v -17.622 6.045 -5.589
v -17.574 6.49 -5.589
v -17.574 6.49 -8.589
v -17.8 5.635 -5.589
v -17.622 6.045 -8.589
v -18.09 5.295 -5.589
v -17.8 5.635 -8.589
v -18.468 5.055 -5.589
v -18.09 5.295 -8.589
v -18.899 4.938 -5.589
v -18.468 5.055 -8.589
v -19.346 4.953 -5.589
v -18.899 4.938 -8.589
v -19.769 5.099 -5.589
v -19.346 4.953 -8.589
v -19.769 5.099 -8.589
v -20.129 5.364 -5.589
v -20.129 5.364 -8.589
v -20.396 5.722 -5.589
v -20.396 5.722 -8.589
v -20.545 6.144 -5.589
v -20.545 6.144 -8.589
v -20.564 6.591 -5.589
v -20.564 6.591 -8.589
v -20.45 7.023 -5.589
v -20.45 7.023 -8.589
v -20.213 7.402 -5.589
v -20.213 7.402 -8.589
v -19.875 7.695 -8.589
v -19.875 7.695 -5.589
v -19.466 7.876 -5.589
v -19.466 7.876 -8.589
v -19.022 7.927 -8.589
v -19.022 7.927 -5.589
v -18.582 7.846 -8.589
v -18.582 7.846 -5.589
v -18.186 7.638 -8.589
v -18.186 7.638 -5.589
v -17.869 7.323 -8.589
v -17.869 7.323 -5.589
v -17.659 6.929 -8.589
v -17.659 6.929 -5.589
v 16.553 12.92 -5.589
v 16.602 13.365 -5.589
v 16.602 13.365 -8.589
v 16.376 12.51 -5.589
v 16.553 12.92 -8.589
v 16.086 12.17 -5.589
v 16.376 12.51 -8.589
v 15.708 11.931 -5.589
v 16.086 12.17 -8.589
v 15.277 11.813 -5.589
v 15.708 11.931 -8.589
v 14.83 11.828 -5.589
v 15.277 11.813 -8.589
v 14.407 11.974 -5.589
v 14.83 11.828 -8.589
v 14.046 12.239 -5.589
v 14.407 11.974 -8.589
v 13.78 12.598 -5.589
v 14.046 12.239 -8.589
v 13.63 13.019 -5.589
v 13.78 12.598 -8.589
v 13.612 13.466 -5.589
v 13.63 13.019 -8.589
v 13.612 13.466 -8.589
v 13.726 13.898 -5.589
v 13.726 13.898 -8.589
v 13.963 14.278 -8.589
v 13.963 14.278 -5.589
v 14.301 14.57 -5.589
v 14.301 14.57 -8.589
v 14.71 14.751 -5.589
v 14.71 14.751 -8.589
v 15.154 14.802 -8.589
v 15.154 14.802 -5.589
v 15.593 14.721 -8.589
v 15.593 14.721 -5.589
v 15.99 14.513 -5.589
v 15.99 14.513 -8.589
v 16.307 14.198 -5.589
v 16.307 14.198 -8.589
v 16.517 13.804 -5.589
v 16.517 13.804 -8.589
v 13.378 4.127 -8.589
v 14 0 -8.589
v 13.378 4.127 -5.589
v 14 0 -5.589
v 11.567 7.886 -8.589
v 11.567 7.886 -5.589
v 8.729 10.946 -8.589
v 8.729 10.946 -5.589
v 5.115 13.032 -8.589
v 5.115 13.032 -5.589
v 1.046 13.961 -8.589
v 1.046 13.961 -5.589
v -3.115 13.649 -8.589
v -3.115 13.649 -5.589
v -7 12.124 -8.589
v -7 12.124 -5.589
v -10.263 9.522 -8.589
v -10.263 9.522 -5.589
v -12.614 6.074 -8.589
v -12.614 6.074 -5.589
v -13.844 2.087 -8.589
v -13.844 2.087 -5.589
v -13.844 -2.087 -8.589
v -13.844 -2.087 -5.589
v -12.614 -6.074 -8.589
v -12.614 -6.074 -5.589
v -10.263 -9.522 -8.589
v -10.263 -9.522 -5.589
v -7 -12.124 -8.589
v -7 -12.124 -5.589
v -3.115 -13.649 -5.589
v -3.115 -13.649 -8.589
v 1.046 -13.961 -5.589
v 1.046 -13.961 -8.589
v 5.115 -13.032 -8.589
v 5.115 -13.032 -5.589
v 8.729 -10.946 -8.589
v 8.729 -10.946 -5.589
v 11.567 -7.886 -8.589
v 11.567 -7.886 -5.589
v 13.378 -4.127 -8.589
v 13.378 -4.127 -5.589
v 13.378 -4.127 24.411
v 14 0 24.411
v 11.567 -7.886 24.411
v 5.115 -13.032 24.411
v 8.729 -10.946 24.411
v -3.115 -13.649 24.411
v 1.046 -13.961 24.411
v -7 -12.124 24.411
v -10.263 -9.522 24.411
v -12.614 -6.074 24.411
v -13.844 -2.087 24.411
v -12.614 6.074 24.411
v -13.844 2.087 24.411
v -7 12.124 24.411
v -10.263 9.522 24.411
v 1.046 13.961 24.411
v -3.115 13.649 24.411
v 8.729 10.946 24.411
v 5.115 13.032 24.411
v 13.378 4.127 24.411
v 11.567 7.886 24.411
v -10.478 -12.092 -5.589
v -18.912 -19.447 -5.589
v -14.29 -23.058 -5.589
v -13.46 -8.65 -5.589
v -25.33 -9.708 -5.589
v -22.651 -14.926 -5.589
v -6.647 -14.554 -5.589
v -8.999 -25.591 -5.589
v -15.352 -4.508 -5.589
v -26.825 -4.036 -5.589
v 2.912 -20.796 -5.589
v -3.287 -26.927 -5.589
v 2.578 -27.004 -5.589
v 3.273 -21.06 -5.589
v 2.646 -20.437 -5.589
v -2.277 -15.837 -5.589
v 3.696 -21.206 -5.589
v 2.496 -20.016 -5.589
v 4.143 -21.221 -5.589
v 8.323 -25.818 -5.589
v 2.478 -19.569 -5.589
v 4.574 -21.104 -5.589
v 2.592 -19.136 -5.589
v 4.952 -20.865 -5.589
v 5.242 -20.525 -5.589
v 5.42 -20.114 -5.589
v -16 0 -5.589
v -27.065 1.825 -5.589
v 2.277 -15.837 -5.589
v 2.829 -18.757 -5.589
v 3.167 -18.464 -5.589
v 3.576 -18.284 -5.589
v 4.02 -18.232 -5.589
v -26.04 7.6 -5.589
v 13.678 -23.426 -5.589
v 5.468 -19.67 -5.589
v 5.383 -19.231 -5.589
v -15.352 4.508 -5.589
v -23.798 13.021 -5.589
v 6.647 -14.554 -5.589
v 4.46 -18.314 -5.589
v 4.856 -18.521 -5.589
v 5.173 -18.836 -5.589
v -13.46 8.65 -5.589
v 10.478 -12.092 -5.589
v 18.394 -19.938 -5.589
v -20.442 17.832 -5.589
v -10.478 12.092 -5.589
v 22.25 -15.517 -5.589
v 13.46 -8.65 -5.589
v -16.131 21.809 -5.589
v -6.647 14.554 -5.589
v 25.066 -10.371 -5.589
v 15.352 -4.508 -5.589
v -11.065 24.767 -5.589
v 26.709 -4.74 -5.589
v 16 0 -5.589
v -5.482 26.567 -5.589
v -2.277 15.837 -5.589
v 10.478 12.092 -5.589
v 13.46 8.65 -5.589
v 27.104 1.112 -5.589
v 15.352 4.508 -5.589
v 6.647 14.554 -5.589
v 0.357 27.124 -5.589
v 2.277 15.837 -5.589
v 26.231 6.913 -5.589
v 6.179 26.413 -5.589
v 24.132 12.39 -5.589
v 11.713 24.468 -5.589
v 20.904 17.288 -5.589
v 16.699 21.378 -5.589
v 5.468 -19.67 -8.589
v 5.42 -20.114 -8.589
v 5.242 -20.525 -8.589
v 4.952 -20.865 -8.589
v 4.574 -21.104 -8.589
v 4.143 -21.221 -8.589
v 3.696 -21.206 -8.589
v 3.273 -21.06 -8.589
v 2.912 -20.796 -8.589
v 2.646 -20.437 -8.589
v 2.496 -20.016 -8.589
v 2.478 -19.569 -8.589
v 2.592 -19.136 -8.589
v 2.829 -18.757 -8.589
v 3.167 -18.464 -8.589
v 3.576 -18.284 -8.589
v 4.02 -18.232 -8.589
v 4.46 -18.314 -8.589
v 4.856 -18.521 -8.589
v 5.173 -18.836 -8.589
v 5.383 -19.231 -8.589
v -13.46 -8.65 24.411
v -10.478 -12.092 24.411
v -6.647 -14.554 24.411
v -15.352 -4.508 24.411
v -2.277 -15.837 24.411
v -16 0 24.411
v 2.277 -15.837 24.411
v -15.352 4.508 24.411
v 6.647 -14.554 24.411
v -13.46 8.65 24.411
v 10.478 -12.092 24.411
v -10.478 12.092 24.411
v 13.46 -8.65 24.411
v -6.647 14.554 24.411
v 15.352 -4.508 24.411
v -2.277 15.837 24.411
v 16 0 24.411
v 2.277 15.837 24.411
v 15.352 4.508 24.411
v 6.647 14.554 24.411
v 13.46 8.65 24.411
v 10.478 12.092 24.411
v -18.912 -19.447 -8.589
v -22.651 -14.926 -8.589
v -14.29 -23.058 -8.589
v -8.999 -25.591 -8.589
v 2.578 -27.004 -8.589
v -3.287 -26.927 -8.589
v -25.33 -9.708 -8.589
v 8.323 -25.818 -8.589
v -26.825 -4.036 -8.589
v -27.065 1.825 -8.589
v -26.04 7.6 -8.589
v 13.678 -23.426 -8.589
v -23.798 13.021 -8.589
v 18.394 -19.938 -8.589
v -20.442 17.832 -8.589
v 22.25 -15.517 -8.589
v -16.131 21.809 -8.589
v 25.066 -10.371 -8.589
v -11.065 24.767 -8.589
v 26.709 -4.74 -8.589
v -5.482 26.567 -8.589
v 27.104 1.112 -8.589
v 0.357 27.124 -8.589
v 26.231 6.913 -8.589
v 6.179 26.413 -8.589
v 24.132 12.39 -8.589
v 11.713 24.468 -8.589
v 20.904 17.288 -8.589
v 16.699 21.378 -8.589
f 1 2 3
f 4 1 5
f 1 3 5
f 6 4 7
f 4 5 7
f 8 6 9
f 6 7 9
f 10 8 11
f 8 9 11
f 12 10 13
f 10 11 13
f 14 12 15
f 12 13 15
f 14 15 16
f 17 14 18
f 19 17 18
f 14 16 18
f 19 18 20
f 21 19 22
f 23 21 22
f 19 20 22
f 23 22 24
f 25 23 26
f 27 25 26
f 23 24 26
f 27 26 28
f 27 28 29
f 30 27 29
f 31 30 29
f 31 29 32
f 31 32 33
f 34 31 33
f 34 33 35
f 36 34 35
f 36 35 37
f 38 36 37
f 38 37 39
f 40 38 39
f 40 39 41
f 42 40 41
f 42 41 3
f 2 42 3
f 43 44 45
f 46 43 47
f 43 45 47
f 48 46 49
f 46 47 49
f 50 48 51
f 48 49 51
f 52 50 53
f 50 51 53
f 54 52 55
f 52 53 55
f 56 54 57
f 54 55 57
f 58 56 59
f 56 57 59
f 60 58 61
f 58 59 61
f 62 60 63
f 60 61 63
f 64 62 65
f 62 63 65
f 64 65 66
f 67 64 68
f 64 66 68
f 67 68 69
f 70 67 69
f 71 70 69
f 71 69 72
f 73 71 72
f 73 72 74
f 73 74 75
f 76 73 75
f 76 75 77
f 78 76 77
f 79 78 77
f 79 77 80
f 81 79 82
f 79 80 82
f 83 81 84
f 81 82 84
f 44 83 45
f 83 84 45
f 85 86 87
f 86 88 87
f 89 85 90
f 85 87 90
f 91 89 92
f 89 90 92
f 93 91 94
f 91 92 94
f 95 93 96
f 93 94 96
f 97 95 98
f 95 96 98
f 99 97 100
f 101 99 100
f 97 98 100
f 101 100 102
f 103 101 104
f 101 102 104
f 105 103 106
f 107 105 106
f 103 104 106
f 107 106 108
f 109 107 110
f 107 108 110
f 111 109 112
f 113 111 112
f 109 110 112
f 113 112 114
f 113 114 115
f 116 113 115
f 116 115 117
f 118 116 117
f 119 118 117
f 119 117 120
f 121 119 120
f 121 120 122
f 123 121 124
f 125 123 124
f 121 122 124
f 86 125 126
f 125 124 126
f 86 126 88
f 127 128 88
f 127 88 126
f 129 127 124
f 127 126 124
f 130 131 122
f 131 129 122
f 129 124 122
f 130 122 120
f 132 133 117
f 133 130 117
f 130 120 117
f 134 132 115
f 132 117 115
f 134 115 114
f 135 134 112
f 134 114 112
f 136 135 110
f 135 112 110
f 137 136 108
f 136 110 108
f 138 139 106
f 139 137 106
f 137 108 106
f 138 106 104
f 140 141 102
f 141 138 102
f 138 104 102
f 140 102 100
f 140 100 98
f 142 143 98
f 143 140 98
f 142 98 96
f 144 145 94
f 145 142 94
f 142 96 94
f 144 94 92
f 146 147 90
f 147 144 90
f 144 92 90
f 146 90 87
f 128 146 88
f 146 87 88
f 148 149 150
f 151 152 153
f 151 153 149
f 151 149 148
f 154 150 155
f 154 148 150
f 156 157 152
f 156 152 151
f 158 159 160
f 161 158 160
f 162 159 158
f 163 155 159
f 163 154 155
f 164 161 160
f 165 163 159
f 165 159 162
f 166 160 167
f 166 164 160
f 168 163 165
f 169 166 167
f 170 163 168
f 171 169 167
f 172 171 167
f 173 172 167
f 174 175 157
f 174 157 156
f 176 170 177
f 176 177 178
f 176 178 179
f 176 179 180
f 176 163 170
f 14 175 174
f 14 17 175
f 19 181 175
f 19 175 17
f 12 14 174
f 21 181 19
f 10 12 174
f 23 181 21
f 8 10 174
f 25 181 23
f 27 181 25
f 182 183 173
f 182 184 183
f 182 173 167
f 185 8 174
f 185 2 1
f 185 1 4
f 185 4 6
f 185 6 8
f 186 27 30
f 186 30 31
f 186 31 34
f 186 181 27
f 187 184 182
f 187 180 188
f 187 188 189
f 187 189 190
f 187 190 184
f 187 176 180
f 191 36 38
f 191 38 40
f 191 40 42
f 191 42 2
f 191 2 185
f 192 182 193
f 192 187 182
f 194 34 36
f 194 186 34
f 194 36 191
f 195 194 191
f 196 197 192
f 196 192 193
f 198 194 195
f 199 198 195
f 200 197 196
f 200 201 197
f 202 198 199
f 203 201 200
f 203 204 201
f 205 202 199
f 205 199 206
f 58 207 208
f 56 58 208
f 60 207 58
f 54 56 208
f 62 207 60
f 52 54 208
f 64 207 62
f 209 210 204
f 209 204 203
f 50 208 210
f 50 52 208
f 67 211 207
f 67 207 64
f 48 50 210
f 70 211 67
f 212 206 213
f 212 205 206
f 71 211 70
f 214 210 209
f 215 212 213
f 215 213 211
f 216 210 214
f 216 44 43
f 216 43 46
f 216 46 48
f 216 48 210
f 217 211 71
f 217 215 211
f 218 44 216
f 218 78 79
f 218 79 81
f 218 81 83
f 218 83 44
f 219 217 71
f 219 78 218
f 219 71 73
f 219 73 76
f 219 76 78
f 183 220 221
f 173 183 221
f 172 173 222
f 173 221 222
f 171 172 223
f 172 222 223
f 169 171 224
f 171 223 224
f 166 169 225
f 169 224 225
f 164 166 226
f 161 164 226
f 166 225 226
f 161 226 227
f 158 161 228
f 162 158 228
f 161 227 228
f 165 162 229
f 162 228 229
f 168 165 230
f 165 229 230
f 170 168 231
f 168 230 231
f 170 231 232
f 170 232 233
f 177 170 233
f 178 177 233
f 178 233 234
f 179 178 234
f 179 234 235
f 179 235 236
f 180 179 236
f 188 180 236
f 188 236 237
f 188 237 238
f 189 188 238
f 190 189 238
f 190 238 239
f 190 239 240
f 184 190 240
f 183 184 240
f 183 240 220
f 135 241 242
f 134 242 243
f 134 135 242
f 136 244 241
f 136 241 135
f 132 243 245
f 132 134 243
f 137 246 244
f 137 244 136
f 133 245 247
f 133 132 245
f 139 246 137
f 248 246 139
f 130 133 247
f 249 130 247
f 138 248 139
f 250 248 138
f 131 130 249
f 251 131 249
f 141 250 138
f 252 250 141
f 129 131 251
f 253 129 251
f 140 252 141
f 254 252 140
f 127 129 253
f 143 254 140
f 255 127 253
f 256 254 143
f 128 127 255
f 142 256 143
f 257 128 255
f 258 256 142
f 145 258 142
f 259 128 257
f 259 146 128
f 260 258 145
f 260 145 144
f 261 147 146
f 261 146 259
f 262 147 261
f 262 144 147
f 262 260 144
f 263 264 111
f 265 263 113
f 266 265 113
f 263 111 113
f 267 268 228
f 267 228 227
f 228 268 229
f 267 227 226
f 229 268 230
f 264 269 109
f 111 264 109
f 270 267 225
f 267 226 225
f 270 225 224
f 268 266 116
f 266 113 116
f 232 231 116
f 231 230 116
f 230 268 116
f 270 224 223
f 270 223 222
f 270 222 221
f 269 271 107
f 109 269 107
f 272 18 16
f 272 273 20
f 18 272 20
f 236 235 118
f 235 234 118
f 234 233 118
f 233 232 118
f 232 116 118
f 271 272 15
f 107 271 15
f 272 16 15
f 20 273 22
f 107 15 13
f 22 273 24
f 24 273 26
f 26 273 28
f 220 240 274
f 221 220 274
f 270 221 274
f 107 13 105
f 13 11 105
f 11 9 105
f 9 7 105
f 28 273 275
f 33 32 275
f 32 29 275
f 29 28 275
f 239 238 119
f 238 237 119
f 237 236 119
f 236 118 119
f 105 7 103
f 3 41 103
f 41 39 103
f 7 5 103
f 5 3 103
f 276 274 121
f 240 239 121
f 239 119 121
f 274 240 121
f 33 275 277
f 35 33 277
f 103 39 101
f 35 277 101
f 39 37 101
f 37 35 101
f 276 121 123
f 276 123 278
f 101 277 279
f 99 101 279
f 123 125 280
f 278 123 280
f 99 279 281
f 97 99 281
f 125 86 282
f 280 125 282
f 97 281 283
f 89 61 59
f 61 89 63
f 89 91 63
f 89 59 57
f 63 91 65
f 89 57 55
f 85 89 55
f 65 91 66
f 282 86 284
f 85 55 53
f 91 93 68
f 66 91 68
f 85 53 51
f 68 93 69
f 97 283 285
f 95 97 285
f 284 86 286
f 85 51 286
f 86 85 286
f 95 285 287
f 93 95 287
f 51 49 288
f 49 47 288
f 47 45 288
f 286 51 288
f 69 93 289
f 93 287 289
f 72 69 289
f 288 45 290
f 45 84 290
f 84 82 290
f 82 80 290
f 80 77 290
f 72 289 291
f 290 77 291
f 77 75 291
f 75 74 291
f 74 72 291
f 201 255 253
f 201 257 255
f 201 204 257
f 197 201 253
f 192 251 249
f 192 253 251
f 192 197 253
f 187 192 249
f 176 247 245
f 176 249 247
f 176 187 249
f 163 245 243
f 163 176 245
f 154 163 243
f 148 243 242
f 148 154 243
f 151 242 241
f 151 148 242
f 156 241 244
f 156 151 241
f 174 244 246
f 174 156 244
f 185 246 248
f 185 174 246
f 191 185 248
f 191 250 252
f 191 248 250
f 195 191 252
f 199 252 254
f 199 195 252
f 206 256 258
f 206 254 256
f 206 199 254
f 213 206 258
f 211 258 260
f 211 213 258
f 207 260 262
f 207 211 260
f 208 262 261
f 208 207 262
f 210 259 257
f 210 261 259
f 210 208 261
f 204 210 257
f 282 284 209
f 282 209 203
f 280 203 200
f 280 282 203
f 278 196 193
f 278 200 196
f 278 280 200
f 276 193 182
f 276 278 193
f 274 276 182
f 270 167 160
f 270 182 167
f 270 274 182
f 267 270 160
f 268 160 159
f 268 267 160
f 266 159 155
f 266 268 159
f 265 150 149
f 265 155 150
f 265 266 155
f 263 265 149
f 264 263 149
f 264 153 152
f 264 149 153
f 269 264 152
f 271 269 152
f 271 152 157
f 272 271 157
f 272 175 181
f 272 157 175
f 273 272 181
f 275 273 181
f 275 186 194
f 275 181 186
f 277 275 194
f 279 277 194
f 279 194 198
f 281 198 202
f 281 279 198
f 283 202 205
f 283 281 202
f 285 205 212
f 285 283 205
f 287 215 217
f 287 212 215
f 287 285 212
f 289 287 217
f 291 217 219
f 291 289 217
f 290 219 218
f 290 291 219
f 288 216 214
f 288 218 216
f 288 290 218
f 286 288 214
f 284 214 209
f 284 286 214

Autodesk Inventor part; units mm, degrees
ref_plane "YZ Plane" through (0, 0, 0) normal (1, 0, 0) x (0, 1, 0)
ref_plane "XZ Plane" through (0, 0, 0) normal (0, 1, 0) x (-1, 0, 0)
ref_plane "XY Plane" through (0, 0, 0) normal (0, 0, 1) x (1, 0, 0)
sketch "Sketch9" plane through (0, 0, -8.5889) normal (0, 0, 1) x (0.9992, 0.041, 0)
  circle A0 centre (0, 0) radius 27.1267
  circle A1 centre (0, 0) radius 20.1267
  circle A2 centre (-18.793, 7.2047) radius 1.5
  circle A3 centre (3.157, -19.8775) radius 1.5
  circle A4 centre (-7.3961, 16.9572) radius 3
  circle A5 centre (-7.3961, 16.9572) radius 3
  circle A6 centre (15.6359, 12.6728) radius 1.5
  dimension "d13" = 40.2533
  dimension "d14" = 54.2533
extrude "Extrusion1" add sketch "Sketch9" along normal blind 3 contours A0 | A1 A3 A2 A4 A6 | A6 A1 | A1 A6 | A3 A1 | A1 A3 | A4 A1 | A1 A4 | A2 A1 | A1 A2
sketch "Sketch2" plane through (0, 0, -5.5889) normal (0, 0, 1) x (1, 0, 0)
  circle A0 centre (0, 0) radius 16
  circle A1 centre (0, 0) radius 14
  dimension "d3" = 32
  dimension "d6" = 2
extrude "Extrusion3" add sketch "Sketch2" along normal blind 30
extrude "Extrusion4" cut sketch "Sketch2" against normal through all contours A1
extrude "Extrusion5" cut sketch "Sketch9" along normal through all contours A6 A1 | A1 A6 | A3 A1 | A1 A3 | A2 A1 | A1 A2
properties part number "SzenzorSzuportKerek" material "PPS Plastic"
